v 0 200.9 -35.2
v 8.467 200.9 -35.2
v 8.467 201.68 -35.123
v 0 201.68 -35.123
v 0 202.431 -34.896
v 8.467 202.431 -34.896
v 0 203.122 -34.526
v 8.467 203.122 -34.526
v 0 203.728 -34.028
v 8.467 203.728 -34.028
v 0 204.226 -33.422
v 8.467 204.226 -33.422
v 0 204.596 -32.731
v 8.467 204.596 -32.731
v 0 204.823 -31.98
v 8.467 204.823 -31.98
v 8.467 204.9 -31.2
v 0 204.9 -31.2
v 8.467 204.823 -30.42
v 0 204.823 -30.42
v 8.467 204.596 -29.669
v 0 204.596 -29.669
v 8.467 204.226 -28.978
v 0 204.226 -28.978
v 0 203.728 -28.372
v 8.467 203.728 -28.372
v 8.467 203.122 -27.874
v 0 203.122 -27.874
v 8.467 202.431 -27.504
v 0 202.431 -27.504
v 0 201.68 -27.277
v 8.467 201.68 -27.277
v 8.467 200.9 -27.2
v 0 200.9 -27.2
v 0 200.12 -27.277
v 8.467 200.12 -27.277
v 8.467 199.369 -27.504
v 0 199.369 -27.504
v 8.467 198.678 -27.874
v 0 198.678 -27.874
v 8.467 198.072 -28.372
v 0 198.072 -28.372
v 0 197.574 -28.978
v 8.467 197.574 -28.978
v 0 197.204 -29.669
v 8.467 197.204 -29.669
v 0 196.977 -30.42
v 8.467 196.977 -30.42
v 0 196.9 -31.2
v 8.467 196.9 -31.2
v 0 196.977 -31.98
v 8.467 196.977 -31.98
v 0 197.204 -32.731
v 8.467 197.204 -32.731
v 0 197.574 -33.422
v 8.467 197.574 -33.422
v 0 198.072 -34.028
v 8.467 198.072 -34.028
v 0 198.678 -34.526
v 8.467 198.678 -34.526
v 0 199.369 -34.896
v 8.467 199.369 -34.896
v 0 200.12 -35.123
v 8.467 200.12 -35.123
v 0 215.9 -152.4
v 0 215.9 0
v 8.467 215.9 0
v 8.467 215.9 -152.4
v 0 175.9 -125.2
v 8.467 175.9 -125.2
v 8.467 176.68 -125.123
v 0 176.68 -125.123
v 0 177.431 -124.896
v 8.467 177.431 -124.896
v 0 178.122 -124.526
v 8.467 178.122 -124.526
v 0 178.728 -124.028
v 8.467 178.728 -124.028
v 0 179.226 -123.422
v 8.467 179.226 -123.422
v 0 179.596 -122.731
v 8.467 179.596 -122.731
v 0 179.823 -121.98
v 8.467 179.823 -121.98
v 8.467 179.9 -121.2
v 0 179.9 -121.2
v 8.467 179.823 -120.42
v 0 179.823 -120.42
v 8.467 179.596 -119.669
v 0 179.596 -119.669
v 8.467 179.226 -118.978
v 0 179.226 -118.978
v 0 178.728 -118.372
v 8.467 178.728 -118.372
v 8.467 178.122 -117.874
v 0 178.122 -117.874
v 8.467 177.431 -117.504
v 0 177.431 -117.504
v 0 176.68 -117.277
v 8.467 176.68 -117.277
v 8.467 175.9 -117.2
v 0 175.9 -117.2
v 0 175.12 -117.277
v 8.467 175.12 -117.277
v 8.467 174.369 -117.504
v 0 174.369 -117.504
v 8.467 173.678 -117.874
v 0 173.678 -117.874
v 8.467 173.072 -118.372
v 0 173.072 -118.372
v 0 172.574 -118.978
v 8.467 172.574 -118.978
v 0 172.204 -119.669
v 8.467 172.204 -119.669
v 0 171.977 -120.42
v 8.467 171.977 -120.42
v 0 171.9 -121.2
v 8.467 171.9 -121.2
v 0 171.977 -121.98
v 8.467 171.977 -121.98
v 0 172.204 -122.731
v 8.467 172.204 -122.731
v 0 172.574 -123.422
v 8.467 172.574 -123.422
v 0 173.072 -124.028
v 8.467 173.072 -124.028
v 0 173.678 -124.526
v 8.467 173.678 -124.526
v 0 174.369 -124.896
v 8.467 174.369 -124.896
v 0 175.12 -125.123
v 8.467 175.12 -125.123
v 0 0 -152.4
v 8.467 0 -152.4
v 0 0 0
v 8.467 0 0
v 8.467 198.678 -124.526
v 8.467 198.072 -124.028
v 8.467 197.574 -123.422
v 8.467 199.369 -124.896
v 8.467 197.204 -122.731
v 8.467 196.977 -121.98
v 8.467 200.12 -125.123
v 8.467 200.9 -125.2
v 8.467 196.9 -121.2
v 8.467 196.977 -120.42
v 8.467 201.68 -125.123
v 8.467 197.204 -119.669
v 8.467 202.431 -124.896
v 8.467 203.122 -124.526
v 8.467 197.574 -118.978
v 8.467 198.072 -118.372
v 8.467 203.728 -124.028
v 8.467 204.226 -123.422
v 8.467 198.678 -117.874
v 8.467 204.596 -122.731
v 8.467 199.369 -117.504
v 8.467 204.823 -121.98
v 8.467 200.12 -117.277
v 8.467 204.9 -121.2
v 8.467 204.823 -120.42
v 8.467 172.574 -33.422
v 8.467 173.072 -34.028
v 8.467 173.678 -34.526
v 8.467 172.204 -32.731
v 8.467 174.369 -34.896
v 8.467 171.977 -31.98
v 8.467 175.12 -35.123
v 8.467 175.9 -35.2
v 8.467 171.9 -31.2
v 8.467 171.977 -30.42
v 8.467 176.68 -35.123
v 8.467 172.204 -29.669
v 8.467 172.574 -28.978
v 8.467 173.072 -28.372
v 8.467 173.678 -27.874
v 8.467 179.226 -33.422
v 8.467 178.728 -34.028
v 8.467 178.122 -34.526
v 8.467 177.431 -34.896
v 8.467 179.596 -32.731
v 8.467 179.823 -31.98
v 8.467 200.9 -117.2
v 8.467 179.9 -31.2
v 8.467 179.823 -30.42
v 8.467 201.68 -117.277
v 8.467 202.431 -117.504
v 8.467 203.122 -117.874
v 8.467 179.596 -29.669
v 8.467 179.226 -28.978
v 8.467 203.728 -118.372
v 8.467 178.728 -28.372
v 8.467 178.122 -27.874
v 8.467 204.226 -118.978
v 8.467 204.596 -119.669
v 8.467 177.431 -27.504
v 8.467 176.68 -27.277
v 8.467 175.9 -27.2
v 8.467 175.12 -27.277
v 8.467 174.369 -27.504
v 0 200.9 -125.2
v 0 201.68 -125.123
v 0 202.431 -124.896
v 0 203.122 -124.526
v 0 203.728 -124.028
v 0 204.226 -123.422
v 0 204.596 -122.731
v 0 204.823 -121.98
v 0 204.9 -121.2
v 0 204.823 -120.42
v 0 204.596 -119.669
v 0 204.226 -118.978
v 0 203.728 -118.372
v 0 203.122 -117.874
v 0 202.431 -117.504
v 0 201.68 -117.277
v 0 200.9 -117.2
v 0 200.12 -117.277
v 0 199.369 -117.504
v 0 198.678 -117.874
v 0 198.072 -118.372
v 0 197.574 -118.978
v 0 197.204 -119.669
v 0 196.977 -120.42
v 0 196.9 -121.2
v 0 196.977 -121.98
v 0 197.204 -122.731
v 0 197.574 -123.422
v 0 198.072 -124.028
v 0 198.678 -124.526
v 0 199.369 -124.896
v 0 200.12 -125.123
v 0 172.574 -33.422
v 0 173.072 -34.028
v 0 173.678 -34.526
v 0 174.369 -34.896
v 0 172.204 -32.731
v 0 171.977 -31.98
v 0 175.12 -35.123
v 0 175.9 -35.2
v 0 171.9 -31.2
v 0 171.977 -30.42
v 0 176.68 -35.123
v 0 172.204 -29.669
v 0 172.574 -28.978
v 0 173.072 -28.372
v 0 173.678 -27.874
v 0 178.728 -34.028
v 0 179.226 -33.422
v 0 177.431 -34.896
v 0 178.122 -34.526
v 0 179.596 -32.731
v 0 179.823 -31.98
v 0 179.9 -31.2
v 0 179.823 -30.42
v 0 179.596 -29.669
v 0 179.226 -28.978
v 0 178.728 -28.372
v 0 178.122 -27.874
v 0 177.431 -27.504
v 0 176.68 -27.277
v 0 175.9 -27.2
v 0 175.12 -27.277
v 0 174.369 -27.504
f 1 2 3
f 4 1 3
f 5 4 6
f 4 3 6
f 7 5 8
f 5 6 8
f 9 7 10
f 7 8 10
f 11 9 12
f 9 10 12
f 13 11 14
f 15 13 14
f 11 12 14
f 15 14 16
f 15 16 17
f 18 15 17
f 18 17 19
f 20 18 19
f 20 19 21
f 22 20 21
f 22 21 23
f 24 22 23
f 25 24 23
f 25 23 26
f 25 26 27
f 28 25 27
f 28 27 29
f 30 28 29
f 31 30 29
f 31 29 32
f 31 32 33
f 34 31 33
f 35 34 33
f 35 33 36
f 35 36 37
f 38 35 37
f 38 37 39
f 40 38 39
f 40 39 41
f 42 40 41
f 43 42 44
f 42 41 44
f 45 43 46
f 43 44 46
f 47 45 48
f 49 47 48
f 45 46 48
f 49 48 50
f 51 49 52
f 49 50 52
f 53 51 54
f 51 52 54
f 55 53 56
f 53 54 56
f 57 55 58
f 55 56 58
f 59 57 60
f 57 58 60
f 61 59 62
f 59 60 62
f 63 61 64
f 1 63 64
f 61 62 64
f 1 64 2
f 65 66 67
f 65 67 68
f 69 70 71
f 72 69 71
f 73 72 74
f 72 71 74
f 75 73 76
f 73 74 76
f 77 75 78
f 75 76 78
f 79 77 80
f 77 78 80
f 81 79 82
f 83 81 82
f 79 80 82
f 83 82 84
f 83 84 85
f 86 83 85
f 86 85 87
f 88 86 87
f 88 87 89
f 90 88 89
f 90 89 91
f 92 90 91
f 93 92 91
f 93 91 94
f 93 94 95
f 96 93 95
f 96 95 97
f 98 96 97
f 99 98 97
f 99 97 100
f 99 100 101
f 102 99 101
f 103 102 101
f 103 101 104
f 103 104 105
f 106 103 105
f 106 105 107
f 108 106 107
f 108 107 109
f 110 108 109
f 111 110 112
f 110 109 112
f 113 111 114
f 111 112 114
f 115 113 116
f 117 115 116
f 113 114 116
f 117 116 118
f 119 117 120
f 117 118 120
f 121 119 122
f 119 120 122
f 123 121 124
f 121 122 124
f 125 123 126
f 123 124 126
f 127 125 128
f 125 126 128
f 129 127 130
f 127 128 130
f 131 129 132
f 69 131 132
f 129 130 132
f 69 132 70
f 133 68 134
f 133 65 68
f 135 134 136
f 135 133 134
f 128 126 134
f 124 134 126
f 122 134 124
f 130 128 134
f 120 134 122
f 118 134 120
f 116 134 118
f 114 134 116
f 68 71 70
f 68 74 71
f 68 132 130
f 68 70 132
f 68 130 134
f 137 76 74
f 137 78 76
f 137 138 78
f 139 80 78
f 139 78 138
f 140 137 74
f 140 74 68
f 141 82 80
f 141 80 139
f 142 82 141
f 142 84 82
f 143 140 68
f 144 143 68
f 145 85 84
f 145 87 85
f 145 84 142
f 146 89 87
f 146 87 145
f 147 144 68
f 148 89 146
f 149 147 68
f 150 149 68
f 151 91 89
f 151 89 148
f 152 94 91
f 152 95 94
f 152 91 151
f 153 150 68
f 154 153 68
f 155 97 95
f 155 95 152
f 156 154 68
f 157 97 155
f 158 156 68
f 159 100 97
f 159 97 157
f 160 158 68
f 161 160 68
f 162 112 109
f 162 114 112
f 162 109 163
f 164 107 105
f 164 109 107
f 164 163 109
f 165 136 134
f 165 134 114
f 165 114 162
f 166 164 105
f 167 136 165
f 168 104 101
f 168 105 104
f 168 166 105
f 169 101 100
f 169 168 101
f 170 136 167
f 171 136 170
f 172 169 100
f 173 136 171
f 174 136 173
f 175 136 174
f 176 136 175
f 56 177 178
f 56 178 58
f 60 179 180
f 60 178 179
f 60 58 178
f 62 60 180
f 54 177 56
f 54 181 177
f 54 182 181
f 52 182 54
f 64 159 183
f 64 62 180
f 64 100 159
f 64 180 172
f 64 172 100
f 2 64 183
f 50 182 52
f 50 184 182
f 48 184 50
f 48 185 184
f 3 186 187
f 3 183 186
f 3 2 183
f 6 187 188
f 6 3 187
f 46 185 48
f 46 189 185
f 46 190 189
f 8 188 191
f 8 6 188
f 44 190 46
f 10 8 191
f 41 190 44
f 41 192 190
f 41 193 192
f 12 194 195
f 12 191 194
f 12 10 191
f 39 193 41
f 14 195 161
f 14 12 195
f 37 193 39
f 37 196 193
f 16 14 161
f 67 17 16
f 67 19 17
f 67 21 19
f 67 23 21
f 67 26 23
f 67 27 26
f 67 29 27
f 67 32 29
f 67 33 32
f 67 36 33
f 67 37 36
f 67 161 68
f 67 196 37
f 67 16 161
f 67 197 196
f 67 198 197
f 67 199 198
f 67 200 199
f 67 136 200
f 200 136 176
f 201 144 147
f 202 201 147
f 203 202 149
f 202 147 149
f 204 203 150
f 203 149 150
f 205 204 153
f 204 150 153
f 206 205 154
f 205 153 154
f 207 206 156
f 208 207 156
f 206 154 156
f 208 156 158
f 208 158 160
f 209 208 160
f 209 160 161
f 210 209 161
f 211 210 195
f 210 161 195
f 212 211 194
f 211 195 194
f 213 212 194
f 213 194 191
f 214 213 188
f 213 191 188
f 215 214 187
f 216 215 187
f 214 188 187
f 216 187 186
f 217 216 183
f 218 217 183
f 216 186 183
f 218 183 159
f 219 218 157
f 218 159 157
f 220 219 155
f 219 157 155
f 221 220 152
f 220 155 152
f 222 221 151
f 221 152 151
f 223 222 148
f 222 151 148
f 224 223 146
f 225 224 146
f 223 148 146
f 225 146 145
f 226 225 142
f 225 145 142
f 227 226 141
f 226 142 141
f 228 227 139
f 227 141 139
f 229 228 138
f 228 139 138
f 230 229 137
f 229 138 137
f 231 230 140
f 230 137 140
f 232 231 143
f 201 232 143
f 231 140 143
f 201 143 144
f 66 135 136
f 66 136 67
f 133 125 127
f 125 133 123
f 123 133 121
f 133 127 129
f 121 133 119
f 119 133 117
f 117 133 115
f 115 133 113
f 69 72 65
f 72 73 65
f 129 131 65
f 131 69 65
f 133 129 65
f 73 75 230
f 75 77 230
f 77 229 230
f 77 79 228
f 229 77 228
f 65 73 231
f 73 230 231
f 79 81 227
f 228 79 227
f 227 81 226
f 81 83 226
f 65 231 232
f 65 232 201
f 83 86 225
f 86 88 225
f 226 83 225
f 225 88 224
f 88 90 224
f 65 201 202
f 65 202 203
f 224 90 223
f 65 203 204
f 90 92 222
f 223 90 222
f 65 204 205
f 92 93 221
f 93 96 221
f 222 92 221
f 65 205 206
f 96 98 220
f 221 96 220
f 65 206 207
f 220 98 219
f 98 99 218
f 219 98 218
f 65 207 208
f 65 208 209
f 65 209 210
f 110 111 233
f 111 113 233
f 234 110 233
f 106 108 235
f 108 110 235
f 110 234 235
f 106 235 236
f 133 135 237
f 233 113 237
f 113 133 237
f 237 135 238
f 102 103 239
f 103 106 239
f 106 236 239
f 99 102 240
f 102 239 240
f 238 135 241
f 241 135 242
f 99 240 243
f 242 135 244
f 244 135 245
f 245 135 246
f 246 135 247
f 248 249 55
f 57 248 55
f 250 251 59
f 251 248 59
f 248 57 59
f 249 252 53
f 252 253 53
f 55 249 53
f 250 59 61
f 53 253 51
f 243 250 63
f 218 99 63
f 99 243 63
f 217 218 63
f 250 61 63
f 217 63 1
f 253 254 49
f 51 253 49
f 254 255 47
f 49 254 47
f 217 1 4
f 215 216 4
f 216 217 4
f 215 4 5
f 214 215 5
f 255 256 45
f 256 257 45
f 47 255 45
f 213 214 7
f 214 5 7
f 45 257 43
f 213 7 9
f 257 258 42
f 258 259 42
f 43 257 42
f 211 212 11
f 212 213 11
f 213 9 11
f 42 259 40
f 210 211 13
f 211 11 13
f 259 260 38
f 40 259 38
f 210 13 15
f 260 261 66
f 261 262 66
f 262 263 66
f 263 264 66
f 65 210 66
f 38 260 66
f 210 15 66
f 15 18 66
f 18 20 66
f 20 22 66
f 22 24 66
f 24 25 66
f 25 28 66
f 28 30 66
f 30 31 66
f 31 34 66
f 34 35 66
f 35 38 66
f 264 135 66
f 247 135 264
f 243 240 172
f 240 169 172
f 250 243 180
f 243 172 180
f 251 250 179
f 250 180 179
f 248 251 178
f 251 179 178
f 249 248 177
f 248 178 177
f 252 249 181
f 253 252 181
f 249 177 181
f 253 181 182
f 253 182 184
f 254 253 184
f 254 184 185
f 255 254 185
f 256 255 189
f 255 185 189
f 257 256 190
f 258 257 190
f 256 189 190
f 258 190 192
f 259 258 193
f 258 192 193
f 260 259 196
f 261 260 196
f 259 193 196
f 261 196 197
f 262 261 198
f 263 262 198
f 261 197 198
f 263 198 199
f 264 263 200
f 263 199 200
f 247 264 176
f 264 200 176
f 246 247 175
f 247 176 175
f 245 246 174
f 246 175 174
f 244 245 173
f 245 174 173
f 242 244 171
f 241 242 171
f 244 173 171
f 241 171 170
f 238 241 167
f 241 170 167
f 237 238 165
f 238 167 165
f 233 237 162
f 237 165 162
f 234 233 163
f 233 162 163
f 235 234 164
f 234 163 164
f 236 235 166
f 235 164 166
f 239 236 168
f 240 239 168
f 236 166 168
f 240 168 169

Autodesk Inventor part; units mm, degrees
ref_plane "YZ Plane" through (0, 0, 0) normal (1, 0, 0) x (0, 1, 0)
ref_plane "XZ Plane" through (0, 0, 0) normal (0, 1, 0) x (-1, 0, 0)
ref_plane "XY Plane" through (0, 0, 0) normal (0, 0, 1) x (1, 0, 0)
sketch "Sketch1" plane through (0, 0, 0) normal (1, 0, 0) x (0, 1, 0)
  line L0 (0, 0) -> (215.9, 0)
  line L1 (215.9, 0) -> (215.9, -152.4)
  line L2 (215.9, -152.4) -> (0, -152.4)
  line L3 (0, -152.4) -> (0, 0)
  dimension "d0" = 152.4
  dimension "d1" = 215.9
extrude "Extrusion1" add sketch "Sketch1" along normal blind 8.4667
sketch "Sketch3" plane through (8.4667, 0, 0) normal (1, 0, 0) x (0, 0, -1)
  line L0 (121.2, 175.9) -> (31.2, 175.9) construction
  line L1 (31.2, 175.9) -> (31.2, 200.9) construction
  line L2 (31.2, 200.9) -> (121.2, 200.9) construction
  line L3 (121.2, 200.9) -> (121.2, 175.9) construction
  circle A0 centre (121.2, 175.9) radius 4
  circle A1 centre (31.2, 175.9) radius 4
  circle A2 centre (121.2, 200.9) radius 4
  circle A3 centre (31.2, 200.9) radius 4
  line L4 (152.4, 215.9) -> (0, 215.9) construction
  point P0 (0, 0)
  point P1 (76.2, 175.9)
  point P2 (76.2, 215.9)
  point P3 (76.2, 215.9)
  dimension "d4" = 8
  dimension "d5" = 25
  dimension "d6" = 90
  dimension "d7" = 15
extrude "Extrusion2" cut sketch "Sketch3" against normal blind 8.4667
properties part number "Y_PLATE"
